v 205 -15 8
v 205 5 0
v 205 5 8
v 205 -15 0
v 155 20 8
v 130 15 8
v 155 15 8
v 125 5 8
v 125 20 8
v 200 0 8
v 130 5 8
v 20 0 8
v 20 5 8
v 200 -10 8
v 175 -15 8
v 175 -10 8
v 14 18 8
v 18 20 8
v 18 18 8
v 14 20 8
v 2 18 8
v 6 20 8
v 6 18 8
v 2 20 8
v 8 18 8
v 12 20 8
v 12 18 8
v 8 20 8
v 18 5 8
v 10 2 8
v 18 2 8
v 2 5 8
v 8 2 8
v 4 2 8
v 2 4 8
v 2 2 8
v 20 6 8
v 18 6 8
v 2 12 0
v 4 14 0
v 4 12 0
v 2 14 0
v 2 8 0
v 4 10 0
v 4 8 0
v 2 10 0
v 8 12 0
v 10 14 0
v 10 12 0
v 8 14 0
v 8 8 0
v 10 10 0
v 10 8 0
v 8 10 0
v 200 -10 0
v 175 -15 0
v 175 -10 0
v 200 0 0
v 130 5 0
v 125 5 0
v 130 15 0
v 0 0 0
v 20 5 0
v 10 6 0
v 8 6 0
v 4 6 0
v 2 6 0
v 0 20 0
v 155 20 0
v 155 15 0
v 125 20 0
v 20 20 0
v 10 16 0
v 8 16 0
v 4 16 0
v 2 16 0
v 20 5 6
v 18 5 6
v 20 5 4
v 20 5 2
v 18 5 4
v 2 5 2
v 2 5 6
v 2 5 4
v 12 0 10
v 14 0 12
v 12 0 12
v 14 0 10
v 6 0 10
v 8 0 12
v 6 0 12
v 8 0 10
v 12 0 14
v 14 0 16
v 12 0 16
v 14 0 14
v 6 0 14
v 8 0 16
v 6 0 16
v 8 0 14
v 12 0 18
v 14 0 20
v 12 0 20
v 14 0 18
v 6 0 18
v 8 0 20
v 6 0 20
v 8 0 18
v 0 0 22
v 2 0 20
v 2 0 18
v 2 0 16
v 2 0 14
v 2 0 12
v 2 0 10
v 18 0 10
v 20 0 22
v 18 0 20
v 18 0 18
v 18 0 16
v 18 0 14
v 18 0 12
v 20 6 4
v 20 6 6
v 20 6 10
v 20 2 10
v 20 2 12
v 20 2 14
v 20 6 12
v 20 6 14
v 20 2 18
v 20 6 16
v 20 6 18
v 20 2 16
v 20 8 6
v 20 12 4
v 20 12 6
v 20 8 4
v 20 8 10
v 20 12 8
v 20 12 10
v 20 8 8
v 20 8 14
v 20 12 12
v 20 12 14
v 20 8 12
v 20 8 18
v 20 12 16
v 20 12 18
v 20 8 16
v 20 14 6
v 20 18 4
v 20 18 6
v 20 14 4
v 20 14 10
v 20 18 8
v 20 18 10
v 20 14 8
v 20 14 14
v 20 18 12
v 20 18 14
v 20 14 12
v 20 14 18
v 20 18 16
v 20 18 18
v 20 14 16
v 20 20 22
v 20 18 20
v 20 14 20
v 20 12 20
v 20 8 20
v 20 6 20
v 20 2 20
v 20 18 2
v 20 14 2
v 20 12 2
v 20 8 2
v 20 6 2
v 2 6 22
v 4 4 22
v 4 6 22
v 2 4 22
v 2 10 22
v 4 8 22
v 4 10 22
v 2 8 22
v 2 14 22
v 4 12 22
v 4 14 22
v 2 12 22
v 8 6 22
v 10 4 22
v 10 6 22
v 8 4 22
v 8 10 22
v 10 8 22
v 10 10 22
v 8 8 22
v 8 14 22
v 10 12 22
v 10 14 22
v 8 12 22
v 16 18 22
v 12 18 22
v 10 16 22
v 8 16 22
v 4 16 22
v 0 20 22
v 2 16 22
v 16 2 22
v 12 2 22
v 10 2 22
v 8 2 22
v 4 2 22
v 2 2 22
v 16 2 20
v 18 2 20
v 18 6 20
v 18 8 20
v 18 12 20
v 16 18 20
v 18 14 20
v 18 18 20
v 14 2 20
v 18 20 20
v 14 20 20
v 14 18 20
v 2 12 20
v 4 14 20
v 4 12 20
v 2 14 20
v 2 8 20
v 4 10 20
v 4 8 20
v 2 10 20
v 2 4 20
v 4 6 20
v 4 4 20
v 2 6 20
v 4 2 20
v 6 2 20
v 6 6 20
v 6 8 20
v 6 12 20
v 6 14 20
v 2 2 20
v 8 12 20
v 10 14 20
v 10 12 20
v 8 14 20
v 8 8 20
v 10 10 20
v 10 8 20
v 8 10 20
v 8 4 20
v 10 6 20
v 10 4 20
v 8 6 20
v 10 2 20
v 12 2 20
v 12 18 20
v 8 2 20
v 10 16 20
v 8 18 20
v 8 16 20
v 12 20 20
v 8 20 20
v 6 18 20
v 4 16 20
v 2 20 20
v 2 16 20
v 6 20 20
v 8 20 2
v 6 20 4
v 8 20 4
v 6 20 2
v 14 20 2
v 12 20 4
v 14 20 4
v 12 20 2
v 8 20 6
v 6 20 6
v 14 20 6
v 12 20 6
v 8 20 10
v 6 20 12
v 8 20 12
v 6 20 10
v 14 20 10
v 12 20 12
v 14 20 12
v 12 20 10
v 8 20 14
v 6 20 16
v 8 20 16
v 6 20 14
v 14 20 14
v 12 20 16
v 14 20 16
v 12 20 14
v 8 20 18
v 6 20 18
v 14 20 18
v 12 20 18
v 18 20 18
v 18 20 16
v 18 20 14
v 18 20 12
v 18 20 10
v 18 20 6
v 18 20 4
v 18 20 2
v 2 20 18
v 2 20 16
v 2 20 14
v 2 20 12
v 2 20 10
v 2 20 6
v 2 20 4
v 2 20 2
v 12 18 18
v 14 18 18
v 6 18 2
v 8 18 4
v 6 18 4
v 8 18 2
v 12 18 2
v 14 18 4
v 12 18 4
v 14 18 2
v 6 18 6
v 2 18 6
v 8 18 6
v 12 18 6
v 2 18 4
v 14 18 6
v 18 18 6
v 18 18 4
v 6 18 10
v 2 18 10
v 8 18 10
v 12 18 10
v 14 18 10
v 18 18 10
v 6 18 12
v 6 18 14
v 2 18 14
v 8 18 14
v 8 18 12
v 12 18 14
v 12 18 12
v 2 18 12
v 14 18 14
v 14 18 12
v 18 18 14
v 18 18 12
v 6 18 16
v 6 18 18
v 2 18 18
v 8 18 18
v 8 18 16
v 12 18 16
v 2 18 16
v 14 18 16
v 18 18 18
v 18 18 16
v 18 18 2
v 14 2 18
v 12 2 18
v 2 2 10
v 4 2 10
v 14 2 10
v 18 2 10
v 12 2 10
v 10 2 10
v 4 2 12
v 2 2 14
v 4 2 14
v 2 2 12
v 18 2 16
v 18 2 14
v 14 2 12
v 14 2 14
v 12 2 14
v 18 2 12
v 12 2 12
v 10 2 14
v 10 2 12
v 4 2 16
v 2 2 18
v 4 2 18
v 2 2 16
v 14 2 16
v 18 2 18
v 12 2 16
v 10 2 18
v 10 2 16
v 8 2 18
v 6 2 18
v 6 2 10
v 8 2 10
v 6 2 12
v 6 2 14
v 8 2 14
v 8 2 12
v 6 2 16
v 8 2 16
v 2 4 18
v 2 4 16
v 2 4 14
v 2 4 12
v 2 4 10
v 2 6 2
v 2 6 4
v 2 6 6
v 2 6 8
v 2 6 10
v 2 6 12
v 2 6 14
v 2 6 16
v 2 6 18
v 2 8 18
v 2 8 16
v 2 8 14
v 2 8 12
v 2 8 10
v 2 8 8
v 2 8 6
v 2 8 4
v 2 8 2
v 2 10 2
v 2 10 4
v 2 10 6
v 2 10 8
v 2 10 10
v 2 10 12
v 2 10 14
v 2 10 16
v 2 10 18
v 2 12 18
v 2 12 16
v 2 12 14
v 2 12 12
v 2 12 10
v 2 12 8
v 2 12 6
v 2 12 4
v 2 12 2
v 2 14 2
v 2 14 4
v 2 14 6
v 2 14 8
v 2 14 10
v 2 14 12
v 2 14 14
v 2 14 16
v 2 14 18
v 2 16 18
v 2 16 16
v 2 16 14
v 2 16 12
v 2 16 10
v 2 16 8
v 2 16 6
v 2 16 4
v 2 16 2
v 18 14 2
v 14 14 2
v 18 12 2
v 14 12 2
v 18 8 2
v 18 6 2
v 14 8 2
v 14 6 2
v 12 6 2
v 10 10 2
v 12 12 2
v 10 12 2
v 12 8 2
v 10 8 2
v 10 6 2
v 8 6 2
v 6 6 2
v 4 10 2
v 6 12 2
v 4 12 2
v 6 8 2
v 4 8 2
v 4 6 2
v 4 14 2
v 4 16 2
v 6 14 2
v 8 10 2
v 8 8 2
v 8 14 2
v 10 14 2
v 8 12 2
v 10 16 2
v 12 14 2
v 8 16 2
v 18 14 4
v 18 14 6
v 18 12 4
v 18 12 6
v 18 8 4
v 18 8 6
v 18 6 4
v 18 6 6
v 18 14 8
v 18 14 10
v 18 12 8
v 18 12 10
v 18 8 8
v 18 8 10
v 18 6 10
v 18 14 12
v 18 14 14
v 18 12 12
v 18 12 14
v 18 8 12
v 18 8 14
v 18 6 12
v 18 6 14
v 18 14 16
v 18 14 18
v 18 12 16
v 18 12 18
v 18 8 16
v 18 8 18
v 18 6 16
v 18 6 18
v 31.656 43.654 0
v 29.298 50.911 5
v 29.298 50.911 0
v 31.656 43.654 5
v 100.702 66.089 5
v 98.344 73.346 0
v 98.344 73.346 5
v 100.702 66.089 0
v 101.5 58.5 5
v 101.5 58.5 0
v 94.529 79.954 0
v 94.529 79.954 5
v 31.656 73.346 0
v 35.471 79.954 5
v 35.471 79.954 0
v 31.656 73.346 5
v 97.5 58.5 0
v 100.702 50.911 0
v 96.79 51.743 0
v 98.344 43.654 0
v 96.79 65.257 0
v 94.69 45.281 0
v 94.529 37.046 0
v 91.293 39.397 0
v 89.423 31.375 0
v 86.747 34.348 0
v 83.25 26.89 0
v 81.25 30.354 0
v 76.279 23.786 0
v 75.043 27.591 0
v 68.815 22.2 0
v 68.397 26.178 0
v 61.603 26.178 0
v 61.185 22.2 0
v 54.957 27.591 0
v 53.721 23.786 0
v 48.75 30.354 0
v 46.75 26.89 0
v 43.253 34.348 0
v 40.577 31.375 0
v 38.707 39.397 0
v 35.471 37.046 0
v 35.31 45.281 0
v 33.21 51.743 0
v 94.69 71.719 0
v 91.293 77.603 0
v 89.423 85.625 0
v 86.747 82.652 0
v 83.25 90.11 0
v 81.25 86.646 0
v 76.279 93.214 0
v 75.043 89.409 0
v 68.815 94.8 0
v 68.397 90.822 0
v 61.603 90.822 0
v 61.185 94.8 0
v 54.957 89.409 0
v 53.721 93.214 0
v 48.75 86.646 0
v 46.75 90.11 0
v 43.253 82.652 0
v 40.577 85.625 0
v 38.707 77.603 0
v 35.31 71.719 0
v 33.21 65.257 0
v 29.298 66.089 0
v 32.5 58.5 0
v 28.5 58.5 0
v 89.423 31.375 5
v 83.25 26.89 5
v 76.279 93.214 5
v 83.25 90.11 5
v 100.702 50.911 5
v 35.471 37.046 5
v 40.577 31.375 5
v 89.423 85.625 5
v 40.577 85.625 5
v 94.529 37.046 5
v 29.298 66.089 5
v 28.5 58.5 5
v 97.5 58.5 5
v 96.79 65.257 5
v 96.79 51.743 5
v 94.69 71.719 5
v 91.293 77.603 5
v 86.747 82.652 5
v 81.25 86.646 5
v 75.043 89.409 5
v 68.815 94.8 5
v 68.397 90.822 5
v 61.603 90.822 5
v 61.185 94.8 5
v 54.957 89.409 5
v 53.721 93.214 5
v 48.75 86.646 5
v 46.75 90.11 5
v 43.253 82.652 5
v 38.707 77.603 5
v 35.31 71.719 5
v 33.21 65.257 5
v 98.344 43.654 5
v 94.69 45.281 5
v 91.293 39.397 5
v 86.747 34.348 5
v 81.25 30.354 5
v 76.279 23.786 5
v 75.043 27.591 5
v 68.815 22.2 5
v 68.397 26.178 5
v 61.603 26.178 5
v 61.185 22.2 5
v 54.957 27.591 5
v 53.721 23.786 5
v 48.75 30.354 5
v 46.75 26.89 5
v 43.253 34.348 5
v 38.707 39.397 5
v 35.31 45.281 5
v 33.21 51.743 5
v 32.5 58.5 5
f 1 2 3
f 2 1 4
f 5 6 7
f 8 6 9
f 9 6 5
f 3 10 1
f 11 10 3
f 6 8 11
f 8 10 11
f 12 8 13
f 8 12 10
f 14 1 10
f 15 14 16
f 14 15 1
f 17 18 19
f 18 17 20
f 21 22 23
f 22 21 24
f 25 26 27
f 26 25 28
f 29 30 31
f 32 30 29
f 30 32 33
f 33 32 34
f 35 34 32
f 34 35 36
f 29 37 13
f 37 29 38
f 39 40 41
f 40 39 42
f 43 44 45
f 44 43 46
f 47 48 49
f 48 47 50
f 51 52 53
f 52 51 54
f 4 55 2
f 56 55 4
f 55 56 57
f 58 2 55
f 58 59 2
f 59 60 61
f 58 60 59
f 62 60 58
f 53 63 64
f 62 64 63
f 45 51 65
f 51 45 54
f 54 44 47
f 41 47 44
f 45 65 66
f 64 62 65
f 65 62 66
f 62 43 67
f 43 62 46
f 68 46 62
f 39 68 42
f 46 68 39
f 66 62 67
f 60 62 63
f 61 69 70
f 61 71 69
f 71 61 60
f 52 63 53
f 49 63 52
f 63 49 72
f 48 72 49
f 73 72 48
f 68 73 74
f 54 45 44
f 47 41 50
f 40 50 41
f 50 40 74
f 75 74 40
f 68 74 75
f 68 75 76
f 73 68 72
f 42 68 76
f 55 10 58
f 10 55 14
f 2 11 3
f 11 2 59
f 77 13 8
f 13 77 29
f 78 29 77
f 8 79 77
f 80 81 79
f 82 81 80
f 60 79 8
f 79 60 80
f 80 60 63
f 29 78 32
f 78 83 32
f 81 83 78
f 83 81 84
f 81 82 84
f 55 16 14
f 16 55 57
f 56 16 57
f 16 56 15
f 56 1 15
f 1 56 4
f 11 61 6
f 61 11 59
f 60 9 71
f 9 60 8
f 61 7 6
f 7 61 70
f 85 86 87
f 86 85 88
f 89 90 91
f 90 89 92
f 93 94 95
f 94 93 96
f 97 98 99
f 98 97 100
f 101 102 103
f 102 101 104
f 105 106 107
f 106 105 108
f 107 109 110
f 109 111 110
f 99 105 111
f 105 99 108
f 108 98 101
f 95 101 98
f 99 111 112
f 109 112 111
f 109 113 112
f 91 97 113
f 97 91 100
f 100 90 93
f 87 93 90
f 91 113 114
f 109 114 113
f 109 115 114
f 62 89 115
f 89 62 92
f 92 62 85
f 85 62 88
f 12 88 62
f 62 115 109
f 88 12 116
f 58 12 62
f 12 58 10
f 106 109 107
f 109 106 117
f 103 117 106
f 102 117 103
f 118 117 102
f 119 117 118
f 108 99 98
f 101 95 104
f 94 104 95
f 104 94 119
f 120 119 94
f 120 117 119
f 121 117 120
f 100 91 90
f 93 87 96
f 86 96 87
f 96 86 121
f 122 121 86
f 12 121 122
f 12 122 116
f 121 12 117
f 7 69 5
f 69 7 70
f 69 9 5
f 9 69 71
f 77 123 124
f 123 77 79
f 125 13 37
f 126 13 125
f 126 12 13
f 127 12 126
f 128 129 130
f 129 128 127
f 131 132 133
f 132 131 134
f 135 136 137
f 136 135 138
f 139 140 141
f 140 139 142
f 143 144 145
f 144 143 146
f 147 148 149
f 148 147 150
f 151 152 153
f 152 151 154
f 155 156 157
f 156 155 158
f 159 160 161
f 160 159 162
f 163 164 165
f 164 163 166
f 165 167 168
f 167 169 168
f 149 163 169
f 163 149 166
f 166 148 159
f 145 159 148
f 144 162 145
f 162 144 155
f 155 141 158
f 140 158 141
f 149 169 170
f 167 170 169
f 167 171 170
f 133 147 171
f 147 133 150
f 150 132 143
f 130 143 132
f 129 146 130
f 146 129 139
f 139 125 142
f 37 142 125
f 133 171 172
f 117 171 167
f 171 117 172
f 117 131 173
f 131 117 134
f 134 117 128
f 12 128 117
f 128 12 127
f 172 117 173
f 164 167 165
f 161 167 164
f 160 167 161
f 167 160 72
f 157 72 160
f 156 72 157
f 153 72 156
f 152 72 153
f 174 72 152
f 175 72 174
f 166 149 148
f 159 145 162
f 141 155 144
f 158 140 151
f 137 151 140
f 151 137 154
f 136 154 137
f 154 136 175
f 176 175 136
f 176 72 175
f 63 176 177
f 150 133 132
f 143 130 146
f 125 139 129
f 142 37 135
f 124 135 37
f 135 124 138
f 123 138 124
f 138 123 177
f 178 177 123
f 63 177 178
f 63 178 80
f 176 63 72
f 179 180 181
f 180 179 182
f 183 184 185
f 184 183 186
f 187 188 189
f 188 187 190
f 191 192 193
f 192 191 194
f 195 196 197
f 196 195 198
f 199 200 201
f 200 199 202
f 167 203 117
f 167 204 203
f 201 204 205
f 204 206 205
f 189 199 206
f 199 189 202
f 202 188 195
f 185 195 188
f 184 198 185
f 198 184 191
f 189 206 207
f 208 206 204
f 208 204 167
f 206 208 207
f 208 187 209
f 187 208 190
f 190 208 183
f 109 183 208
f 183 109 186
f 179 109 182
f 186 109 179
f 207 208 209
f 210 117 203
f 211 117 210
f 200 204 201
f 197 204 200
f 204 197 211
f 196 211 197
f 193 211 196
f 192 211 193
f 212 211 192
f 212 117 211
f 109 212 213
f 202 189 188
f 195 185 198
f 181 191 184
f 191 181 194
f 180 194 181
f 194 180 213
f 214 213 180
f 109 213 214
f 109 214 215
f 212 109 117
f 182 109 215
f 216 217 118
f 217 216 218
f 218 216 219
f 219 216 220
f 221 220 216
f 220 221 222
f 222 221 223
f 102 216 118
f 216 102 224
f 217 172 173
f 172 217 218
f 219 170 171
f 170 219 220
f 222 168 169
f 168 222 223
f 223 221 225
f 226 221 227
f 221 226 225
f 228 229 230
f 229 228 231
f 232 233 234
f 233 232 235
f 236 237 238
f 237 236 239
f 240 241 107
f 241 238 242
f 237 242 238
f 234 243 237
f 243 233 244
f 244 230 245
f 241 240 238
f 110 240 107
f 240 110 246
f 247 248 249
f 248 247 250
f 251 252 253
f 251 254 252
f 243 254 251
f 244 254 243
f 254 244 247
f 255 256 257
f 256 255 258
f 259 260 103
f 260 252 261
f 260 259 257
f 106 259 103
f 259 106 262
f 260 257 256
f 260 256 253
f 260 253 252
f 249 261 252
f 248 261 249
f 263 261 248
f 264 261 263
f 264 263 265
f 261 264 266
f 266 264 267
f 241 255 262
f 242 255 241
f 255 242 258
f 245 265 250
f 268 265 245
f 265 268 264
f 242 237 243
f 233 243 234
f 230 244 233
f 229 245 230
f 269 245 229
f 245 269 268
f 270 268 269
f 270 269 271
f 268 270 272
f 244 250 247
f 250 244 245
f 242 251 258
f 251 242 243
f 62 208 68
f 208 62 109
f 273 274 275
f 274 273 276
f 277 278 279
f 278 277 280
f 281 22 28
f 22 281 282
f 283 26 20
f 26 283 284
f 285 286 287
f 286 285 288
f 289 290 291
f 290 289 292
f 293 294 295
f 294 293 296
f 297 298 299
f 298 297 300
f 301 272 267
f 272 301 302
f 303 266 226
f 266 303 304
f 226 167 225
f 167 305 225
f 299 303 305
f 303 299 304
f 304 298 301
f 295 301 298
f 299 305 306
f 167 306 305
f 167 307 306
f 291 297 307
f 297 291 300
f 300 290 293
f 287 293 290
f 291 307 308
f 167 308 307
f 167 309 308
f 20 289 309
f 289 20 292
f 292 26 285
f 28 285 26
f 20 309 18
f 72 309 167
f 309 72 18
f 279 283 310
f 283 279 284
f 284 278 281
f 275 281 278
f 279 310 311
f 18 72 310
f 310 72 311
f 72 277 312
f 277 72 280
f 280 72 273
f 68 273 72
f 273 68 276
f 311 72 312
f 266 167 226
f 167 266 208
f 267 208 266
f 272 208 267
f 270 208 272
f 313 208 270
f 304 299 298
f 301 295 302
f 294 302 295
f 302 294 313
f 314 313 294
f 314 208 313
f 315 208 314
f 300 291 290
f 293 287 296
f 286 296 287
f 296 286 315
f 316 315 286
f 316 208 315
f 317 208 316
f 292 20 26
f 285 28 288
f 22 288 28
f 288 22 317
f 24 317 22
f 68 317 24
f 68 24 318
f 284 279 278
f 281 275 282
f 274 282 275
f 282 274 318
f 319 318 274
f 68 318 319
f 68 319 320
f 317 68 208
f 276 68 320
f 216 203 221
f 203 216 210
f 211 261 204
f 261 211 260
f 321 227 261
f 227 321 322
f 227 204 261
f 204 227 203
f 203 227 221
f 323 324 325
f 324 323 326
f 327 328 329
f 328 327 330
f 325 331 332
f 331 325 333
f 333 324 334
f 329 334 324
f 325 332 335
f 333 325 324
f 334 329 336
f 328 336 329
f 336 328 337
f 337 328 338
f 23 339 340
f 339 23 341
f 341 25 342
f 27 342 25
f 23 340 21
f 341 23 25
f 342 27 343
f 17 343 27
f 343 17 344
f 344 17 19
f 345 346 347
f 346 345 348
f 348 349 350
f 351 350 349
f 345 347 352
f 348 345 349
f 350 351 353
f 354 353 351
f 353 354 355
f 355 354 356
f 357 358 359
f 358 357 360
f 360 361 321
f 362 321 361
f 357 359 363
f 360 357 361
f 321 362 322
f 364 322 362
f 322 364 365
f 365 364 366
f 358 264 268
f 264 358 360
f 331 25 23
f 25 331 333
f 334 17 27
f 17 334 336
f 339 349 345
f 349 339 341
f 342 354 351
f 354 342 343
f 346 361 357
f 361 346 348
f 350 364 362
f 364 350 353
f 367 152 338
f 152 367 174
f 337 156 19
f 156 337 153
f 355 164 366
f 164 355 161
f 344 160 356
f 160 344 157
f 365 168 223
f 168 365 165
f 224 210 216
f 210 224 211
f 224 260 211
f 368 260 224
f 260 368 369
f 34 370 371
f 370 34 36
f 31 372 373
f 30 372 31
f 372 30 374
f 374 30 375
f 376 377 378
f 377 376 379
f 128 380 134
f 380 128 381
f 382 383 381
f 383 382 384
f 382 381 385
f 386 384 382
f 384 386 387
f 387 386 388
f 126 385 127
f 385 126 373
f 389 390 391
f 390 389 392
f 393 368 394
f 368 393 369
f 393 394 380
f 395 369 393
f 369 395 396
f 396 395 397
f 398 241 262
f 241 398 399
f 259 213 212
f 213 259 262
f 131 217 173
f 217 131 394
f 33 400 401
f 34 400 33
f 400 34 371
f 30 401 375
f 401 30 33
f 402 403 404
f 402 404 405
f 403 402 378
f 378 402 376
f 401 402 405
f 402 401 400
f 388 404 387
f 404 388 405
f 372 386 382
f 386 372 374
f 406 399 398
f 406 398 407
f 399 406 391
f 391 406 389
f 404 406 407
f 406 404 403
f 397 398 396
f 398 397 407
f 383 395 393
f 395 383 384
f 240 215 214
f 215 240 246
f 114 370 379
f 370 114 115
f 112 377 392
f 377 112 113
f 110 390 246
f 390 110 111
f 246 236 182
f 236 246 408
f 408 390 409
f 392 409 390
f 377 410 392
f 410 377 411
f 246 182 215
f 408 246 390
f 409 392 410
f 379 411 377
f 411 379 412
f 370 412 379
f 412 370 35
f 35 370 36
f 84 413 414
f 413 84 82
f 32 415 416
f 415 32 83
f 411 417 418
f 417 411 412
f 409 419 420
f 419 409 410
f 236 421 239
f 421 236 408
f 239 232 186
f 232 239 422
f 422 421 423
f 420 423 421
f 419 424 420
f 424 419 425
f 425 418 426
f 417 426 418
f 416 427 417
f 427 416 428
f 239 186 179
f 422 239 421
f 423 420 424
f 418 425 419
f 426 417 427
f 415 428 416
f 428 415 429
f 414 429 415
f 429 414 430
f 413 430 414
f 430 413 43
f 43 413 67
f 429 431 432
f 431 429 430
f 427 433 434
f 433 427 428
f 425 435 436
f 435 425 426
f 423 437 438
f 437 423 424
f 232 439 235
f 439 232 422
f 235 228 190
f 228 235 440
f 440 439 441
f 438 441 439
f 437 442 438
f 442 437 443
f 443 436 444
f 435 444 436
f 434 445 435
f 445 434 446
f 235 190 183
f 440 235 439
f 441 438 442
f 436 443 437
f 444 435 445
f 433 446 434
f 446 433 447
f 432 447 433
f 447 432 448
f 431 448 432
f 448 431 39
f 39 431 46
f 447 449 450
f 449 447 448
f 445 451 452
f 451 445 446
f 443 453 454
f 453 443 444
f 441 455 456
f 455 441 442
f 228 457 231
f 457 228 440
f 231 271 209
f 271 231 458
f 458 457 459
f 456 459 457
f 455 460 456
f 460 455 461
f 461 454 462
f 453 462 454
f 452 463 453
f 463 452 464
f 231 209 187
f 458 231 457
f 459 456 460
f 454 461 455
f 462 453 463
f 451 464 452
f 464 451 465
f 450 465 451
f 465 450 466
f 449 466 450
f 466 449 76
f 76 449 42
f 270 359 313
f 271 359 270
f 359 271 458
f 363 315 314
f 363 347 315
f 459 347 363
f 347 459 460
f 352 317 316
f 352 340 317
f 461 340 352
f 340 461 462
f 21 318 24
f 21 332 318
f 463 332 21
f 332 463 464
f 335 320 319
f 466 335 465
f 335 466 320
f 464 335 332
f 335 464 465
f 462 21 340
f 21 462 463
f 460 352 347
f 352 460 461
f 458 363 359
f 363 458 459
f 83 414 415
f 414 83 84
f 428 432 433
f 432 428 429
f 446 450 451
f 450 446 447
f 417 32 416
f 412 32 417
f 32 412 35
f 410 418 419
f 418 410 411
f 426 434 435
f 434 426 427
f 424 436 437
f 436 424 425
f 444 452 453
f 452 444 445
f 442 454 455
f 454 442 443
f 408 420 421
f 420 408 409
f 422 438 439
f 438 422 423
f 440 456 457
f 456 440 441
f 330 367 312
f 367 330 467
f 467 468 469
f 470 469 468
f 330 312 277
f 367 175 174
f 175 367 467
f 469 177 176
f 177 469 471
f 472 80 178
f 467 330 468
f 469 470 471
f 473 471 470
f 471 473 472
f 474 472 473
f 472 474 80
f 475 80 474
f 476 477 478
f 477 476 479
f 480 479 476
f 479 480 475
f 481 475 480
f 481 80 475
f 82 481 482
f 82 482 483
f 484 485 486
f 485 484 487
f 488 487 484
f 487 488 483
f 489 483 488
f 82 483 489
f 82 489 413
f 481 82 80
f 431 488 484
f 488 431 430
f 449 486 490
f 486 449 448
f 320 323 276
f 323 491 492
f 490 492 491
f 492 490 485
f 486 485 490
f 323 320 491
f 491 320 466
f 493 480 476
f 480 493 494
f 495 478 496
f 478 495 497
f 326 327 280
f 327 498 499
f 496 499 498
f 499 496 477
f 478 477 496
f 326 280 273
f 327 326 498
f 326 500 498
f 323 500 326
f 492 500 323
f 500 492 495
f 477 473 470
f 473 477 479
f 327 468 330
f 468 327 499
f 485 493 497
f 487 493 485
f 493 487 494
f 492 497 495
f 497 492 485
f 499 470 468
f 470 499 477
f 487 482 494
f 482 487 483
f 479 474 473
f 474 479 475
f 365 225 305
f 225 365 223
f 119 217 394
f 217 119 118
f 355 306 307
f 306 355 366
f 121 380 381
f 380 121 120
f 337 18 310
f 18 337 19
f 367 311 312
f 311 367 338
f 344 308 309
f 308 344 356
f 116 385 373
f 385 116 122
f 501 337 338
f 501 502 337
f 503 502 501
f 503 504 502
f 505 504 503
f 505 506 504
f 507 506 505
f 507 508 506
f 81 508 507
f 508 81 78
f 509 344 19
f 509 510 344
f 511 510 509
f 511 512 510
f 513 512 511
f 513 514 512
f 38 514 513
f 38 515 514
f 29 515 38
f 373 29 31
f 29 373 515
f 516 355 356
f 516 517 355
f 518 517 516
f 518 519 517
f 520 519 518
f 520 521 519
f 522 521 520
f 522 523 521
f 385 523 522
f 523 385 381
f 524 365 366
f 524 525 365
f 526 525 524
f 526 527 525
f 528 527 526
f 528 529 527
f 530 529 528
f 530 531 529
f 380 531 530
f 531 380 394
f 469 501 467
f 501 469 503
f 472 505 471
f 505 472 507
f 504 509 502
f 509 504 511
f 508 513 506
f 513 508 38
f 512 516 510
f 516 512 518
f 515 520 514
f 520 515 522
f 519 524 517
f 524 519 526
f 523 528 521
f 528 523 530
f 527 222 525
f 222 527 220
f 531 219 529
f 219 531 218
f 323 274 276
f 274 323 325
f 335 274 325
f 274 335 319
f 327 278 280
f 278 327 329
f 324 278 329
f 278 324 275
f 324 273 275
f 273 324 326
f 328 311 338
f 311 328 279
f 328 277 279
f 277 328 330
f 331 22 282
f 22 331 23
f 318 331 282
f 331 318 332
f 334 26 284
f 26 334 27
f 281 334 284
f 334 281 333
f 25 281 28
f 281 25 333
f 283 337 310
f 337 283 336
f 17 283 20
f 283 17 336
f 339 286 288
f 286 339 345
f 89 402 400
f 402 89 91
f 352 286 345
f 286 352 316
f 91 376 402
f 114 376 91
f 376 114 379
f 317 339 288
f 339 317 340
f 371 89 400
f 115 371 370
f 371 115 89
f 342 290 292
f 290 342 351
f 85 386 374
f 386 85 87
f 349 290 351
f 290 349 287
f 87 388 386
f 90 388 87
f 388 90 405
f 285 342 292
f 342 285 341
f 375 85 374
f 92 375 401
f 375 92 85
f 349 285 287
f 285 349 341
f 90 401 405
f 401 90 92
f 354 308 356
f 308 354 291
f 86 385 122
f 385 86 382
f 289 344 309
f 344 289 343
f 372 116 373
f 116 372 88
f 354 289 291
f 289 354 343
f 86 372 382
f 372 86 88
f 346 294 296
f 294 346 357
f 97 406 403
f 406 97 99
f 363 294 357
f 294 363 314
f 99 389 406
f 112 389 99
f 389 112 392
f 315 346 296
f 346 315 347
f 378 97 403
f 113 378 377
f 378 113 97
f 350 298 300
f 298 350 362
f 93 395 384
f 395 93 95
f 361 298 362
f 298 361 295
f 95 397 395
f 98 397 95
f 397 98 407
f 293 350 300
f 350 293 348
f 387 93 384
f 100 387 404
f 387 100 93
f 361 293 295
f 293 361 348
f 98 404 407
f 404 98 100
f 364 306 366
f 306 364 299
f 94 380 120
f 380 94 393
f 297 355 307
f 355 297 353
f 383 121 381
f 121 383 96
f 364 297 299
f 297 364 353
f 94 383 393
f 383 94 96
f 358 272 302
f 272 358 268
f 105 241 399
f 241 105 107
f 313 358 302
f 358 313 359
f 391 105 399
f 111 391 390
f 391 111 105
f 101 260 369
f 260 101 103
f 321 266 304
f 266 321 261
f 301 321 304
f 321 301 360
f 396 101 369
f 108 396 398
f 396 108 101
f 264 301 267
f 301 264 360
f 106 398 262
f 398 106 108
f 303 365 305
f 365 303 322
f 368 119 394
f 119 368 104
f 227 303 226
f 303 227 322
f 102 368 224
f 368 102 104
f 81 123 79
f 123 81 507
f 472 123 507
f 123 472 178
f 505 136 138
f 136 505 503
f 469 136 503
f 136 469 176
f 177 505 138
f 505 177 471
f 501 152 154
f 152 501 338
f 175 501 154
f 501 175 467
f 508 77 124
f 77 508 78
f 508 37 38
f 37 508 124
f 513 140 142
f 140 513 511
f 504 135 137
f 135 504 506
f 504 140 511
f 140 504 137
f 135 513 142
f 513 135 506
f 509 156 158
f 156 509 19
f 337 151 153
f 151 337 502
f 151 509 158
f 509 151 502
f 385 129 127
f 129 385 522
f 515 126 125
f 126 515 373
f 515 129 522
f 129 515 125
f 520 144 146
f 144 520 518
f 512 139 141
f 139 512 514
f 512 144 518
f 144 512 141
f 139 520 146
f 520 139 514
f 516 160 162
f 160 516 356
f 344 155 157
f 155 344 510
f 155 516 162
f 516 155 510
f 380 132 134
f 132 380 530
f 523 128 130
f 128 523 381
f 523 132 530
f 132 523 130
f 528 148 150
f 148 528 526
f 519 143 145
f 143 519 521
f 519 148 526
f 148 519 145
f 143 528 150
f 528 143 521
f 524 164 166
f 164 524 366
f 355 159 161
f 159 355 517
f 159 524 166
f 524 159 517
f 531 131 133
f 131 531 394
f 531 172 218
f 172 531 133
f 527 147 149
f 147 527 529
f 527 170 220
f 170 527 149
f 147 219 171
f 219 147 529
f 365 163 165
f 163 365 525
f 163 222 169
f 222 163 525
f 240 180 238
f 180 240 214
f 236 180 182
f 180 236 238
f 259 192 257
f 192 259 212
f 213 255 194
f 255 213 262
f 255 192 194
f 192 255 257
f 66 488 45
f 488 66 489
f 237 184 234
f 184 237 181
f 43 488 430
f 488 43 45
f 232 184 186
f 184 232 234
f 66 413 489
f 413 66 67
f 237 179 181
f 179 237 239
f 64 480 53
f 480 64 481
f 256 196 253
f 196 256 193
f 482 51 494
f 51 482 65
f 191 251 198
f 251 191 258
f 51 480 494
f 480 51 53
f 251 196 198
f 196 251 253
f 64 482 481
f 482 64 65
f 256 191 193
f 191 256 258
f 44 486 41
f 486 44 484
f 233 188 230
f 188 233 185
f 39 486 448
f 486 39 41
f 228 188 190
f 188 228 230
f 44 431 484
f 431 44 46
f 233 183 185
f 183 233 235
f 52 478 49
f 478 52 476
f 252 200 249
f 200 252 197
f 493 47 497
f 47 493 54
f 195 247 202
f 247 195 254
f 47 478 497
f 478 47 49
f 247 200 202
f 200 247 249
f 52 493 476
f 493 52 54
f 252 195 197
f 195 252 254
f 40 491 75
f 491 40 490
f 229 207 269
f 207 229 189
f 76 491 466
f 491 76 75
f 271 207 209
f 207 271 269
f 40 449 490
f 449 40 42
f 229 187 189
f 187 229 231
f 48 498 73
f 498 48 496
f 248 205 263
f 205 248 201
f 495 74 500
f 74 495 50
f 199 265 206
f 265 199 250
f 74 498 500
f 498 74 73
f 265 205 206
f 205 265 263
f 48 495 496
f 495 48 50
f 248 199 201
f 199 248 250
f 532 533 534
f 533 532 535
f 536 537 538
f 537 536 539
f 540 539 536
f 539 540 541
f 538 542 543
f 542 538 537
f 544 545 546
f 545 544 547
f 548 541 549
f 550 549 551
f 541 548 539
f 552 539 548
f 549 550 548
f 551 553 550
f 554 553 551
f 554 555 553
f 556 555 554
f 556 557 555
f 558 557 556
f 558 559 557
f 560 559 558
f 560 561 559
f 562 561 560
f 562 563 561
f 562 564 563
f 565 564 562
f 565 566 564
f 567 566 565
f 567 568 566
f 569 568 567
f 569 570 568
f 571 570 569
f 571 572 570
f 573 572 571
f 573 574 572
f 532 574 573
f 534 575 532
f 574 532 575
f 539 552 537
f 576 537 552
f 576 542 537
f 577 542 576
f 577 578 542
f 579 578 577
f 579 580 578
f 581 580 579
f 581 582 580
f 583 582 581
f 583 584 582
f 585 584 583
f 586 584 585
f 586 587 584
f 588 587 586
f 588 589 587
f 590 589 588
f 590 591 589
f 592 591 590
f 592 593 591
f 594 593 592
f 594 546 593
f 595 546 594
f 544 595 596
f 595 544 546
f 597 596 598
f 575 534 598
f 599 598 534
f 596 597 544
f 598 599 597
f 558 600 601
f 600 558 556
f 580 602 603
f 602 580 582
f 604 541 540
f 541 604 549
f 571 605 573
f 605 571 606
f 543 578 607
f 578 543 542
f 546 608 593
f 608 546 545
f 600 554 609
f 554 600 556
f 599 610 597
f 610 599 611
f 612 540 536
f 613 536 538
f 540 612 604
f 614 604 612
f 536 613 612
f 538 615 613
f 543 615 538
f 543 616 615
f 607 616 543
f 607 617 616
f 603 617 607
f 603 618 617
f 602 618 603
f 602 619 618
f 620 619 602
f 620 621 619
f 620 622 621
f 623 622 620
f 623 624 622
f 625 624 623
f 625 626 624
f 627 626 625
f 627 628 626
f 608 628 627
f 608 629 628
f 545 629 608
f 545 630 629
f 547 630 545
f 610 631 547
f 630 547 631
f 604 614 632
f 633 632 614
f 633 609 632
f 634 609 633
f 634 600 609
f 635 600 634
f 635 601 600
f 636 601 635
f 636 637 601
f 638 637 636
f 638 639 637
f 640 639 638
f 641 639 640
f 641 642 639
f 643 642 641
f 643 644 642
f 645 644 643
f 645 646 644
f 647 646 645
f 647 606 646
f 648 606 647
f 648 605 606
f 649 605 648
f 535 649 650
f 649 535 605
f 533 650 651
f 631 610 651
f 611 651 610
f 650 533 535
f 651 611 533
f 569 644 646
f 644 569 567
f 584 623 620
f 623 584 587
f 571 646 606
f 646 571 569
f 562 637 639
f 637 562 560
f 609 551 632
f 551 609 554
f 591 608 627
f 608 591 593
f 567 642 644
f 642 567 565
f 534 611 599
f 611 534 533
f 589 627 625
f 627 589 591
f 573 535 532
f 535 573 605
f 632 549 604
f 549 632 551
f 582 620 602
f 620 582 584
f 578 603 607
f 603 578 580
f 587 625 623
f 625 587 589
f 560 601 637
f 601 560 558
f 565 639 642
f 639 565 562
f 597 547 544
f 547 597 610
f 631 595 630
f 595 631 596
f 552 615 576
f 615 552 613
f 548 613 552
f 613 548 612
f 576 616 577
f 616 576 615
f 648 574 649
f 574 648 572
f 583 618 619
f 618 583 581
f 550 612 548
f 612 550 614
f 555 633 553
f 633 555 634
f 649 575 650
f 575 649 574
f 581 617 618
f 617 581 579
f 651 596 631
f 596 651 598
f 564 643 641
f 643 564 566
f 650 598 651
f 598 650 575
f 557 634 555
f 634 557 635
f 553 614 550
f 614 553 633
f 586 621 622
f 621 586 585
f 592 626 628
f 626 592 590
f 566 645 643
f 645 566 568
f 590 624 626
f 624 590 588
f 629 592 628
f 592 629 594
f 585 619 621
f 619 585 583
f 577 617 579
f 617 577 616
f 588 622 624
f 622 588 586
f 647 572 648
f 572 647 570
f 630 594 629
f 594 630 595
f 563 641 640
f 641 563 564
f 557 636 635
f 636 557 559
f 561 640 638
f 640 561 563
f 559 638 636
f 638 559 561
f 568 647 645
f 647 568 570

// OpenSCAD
r_in = 65/2;
thick = 4;

l = 200;
TL1 = 25;

ttt = 12.3;      //药片直径

module ttt_box(thick){
    cube(size=[20, thick, 20]);
    cube(size=[thick, 20, 20]);
    cube(size=[20, 20, thick]);

    translate([0, 0, 20]) {
        difference(){
            cube(size=[20, 20, thick]);

            translate([20-thick*2-4, thick, 0]) {
                cube(size=[4, 20-thick*2, thick]);
            }
        }
    }

    translate([20-thick, 0, 0]) {
        cube(size=[thick, 20, 20]);
    }

    translate([0, 20-thick, 0]) {
        cube(size=[20, thick, 20]);
    }
}

cube(size=[l, 5, thick*2]);
translate([l, -5*2, 0]) {
    cube(size=[5, 5*3, thick*2]);
    translate([-TL1, -5, 0]) {
            cube(size=[TL1+5, 5, thick*2]);
    }
}
translate([l-75, 0, 0]) {
    cube(size=[5, 5*3, thick*2]);
    translate([0, 5*3, 0]) {
        cube(size=[30, 5, thick*2]);
    }
}

difference(){
    ttt_box(2);
    thick=2;
    for (j=[0:4]) {
        for (i=[0:2]) {
            translate([thick+thick*3*i, 0, thick+j*thick*2]) {
                cube(size=[thick*2, 20, thick]);
            }       
        }
    }
    for (j=[0:4]) {
        for (i=[0:2]) {
            translate([thick, thick+thick*3*i, thick+j*thick*2]) {
                cube(size=[20,thick*2, thick]);
            }       
        }
    }
    j=0;
    for (j=[0:3]) {
        for (i=[0:1]) {
            translate([thick+thick*3*i, thick+j*thick*2, 0]) {
               # cube(size=[thick, thick, 20+2*thick]);
            }       
        }
    }
}


translate([r_in*2, r_in*1.8, 0]) {
    difference(){
        cylinder(r=r_in+thick, h=5);
        cylinder(r=r_in, h=5);
    }
}
